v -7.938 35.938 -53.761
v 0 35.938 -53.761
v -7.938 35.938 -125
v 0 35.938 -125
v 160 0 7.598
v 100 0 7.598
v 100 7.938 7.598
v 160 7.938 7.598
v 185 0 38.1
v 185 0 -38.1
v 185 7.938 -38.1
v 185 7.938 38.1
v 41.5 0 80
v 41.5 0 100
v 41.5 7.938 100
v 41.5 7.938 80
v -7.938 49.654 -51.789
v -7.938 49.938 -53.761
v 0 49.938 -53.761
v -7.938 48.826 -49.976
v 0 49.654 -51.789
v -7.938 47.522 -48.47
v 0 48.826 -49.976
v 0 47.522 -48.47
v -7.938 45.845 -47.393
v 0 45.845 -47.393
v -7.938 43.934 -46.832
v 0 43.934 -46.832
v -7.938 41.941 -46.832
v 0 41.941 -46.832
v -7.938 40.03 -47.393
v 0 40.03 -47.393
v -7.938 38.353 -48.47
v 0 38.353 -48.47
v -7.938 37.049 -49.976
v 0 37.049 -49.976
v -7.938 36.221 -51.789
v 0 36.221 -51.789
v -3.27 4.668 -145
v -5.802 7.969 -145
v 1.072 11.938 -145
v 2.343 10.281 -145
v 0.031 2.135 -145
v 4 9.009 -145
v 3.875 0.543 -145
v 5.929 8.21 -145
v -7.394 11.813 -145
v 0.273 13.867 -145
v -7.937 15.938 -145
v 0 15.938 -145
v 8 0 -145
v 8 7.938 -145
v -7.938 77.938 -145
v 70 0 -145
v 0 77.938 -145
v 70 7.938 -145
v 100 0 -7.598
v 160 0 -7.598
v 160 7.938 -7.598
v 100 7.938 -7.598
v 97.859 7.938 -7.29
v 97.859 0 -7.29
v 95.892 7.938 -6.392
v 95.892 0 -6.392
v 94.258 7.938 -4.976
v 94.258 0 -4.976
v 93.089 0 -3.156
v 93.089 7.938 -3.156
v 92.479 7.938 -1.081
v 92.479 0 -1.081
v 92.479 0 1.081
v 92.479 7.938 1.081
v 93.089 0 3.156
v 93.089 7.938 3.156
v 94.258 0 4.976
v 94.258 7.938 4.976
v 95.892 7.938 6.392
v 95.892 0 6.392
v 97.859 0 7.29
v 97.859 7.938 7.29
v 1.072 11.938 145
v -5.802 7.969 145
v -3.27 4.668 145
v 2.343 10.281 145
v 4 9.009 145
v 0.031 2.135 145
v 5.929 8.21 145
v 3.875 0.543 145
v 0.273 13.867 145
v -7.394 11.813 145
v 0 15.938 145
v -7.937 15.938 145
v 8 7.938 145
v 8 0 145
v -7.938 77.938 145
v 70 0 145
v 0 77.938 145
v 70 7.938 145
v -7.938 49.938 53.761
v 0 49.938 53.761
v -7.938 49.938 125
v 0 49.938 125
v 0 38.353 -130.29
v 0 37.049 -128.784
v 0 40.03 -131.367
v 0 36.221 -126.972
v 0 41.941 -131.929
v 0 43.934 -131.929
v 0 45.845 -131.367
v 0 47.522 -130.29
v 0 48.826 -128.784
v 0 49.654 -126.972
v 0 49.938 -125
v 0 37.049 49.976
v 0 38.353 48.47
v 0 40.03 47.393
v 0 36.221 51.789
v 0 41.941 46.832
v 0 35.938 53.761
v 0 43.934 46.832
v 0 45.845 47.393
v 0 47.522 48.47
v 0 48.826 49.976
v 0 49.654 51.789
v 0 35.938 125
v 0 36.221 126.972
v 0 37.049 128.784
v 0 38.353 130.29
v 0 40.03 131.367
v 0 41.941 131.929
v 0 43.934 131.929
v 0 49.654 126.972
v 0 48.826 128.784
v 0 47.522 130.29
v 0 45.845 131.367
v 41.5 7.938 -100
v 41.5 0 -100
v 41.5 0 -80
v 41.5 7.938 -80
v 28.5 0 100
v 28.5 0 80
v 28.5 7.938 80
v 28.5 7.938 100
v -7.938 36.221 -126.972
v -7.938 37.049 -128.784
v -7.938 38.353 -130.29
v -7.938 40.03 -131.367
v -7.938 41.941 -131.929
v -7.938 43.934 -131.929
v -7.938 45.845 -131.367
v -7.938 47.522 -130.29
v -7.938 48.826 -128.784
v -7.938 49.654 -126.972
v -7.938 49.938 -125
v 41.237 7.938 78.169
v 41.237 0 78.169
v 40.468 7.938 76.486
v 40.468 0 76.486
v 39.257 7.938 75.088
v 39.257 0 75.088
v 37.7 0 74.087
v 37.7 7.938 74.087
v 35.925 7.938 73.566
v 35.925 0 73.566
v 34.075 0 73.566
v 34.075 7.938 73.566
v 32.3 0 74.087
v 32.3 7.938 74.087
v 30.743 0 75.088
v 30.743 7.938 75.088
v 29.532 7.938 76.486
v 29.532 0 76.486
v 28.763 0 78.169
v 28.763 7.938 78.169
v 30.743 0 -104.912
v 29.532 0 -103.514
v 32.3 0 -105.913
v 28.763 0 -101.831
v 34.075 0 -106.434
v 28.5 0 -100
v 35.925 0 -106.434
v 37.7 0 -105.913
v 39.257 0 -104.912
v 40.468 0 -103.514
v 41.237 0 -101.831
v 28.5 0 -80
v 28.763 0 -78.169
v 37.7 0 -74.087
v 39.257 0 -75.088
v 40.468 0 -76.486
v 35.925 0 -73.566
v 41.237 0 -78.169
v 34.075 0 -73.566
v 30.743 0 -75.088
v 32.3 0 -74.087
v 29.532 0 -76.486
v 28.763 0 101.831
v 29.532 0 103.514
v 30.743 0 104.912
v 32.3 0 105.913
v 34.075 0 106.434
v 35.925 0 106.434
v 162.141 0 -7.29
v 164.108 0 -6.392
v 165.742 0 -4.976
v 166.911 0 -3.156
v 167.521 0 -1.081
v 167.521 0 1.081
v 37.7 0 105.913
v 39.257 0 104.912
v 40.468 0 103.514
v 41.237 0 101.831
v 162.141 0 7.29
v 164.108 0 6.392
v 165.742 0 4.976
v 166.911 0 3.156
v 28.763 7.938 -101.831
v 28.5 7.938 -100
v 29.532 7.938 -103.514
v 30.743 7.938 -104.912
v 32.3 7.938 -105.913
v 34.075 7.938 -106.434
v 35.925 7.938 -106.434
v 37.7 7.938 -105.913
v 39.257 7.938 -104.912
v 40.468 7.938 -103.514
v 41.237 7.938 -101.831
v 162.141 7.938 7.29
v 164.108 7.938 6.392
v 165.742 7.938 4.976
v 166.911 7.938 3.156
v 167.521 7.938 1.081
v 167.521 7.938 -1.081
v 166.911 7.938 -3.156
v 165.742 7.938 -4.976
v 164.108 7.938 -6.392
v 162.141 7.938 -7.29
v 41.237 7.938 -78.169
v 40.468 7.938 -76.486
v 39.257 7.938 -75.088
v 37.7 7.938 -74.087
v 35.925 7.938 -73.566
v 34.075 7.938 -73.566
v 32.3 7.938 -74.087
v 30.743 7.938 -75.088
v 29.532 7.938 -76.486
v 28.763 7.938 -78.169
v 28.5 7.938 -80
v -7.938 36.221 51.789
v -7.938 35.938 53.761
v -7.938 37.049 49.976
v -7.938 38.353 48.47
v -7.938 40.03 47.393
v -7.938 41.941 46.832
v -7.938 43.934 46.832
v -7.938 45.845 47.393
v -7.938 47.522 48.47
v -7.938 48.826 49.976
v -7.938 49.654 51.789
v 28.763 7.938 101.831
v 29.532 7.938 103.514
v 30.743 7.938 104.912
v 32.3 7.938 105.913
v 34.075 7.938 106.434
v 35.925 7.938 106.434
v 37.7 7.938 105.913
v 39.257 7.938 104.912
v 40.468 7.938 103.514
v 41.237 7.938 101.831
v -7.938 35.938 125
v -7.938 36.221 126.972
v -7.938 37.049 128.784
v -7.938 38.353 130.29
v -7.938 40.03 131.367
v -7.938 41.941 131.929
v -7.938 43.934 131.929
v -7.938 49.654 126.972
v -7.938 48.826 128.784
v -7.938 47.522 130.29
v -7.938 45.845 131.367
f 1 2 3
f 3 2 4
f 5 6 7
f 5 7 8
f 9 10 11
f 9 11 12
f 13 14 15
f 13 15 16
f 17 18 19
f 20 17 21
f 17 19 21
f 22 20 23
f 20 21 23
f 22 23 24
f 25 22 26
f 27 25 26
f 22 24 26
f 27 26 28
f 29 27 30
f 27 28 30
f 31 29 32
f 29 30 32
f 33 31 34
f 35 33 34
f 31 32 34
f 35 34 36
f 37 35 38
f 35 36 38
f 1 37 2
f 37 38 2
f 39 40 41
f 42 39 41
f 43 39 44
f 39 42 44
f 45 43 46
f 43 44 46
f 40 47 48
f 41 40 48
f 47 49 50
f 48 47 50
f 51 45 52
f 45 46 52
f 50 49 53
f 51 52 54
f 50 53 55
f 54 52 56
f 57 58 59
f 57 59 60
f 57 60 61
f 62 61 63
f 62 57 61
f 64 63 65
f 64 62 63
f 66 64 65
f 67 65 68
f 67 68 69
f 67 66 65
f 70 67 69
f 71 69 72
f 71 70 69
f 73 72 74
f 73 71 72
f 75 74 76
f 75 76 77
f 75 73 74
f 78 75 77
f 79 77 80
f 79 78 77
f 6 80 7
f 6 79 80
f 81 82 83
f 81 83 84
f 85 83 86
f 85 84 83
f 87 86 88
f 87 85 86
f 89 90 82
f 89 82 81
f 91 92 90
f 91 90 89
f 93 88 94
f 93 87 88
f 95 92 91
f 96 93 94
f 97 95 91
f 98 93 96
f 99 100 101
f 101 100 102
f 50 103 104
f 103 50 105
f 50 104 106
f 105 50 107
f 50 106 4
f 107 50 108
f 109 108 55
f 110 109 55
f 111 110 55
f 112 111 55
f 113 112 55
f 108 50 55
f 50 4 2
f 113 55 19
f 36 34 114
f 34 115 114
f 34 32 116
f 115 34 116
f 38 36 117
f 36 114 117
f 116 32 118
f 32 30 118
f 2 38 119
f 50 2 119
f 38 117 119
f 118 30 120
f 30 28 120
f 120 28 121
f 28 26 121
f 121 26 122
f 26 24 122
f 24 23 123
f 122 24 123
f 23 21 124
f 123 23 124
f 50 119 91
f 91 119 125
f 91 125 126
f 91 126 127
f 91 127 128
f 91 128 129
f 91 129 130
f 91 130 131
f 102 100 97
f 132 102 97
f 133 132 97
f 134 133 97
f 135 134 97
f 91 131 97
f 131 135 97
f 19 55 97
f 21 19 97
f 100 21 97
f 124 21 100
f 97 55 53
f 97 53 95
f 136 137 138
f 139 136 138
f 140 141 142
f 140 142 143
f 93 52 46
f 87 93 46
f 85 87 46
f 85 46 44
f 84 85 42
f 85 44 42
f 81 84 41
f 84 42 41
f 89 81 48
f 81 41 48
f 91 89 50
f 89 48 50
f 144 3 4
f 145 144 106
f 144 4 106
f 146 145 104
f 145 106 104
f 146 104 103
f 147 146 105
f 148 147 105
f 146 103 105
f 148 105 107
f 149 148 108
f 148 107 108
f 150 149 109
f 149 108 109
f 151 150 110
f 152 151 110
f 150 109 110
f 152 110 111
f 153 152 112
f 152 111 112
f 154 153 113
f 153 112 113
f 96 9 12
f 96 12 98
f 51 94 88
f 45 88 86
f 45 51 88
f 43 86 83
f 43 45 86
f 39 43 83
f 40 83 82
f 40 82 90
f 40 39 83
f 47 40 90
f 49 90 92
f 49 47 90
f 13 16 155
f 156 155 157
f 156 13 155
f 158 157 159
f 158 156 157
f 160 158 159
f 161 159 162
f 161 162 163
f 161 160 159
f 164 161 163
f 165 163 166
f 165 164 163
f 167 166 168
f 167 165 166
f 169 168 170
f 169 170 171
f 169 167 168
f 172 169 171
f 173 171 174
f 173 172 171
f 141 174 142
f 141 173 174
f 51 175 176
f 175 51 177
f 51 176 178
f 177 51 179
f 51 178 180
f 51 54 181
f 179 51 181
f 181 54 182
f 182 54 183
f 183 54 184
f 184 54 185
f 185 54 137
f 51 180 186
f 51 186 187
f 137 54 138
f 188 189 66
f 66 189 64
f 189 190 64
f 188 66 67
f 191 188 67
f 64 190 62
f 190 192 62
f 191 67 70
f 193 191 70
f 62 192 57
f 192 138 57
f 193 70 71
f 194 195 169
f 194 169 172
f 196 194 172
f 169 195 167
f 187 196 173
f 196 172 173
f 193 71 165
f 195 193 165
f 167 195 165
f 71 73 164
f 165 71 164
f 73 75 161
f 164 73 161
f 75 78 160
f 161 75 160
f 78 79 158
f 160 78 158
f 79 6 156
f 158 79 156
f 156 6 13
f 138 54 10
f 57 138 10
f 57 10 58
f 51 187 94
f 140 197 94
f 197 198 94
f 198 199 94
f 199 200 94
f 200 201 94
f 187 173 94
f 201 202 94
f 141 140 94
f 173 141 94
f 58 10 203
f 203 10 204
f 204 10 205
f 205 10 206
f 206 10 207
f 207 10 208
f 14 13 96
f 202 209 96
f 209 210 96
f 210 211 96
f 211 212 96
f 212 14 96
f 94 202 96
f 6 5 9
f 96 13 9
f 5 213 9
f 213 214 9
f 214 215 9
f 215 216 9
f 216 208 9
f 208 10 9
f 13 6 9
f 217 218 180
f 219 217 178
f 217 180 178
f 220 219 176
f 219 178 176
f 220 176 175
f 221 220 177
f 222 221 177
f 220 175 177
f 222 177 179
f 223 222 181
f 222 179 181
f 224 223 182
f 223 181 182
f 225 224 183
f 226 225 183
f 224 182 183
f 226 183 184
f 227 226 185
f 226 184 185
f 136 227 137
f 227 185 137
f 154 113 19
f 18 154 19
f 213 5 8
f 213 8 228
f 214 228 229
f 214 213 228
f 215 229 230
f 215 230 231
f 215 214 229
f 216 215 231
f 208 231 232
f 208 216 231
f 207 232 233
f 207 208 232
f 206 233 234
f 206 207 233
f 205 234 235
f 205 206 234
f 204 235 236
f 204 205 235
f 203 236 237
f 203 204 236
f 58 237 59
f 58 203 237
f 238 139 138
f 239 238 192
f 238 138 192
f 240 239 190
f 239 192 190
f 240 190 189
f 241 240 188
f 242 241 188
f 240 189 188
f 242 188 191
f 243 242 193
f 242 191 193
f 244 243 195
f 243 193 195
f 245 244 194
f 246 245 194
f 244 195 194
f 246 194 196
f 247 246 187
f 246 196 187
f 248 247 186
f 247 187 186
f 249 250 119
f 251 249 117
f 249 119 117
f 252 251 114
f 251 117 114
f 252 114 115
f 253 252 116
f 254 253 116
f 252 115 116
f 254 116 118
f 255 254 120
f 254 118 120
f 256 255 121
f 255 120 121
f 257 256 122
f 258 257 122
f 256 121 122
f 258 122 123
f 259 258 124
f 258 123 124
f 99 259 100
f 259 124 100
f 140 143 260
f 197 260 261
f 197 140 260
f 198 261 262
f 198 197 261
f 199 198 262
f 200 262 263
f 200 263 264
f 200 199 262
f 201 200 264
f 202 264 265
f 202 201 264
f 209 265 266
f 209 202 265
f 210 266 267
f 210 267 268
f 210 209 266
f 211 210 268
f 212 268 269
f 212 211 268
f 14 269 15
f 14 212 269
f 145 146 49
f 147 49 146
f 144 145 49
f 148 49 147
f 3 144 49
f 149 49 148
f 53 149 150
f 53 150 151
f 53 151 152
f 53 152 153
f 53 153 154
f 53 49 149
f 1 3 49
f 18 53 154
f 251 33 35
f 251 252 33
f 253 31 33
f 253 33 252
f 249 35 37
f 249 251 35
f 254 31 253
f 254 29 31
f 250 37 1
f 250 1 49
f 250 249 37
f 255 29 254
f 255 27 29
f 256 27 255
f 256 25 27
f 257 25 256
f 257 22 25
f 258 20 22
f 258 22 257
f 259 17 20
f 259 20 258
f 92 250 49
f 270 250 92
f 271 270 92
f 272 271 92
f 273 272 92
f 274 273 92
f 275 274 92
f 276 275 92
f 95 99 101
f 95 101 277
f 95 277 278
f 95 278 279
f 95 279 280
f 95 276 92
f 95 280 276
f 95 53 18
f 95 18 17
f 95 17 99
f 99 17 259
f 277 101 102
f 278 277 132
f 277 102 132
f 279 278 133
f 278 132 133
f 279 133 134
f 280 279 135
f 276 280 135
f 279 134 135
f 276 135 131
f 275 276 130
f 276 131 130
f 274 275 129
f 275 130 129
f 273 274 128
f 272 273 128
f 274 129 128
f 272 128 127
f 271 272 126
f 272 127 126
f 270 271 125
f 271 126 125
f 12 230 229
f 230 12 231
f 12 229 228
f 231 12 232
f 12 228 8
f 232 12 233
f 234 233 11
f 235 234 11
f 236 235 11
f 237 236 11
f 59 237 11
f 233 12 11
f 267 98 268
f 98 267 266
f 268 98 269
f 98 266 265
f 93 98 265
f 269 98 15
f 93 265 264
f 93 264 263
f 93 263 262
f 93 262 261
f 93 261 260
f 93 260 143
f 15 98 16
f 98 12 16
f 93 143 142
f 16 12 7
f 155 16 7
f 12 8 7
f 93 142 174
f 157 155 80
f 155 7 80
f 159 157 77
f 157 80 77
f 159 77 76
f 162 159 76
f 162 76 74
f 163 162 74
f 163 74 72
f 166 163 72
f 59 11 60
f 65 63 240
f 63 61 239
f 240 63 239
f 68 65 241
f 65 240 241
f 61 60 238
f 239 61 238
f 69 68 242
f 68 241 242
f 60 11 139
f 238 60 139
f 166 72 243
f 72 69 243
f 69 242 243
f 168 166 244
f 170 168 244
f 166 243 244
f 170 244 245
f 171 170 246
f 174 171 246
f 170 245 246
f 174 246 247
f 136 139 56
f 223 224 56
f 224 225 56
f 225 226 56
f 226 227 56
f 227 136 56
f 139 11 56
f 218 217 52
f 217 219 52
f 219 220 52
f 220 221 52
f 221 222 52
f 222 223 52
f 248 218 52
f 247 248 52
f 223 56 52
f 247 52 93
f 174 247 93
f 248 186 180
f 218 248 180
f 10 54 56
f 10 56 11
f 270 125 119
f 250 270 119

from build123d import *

# Parameters (mm, degrees)
SALIENTE_EXTRUIR1_DEPTH   = 7.9375
CROQUIS2_W                = 290
CROQUIS2_H                = 77.9375
SALIENTE_EXTRUIR2_DEPTH   = 7.9375
CONVERTIR_S_LIDO1_START   = -145
CONVERTIR_S_LIDO1_DEPTH   = 290
CONVERTIR_S_LIDO1_2_DEPTH = 290


# Read off the part's stored shape, not the designer's step: Convertir-Sólido1
with BuildPart() as part:
    # Croquis1 → Saliente-Extruir1 (new body)
    with BuildSketch(Plane(origin=(0, 0, 0), x_dir=(1, 0, 0), z_dir=(0, 1, 0))):
        Polygon((70, -145), (0, -145), (0, 145), (70, 145), (185, 38.1), (185, -38.1), align=None)
        with BuildLine():
            ThreePointArc((41.5, -80), (35, -73.5), (28.5, -80))
            Line((28.5, -80), (28.5, -100))
            ThreePointArc((28.5, -100), (35, -106.5), (41.5, -100))
            Line((41.5, -100), (41.5, -80))
        make_face(mode=Mode.SUBTRACT)
        with BuildLine():
            ThreePointArc((160, -7.597922996), (167.597922996, 0), (160, 7.597922996))
            Line((160, 7.597922996), (100, 7.597922996))
            ThreePointArc((100, 7.597922996), (92.402077004, 0), (100, -7.597922996))
            Line((100, -7.597922996), (160, -7.597922996))
        make_face(mode=Mode.SUBTRACT)
        with BuildLine():
            Line((41.5, 100), (41.5, 80))
            ThreePointArc((41.5, 80), (35, 73.5), (28.5, 80))
            Line((28.5, 80), (28.5, 100))
            ThreePointArc((28.5, 100), (35, 106.5), (41.5, 100))
        make_face(mode=Mode.SUBTRACT)
    extrude(amount=SALIENTE_EXTRUIR1_DEPTH)

    # Croquis2 → Saliente-Extruir2 (add)
    with BuildSketch(Plane.ZY):
        with Locations((0, 38.96875)):
            Rectangle(CROQUIS2_W, CROQUIS2_H)
        with BuildLine():
            ThreePointArc((-125, 35.9375), (-132, 42.9375), (-125, 49.9375))
            Line((-125, 49.9375), (-53.76065494, 49.9375))
            ThreePointArc((-53.76065494, 49.9375), (-46.76065494, 42.9375), (-53.76065494, 35.9375))
            Line((-53.76065494, 35.9375), (-125, 35.9375))
        make_face(mode=Mode.SUBTRACT)
        with BuildLine():
            Line((53.76065494, 49.9375), (125, 49.9375))
            ThreePointArc((125, 49.9375), (132, 42.9375), (125, 35.9375))
            Line((125, 35.9375), (53.76065494, 35.9375))
            ThreePointArc((53.76065494, 35.9375), (46.76065494, 42.9375), (53.76065494, 49.9375))
        make_face(mode=Mode.SUBTRACT)
    extrude(amount=SALIENTE_EXTRUIR2_DEPTH)

    # Convertir-Sólido1 outline → Convertir-Sólido1 (cut)
    with BuildSketch(Plane.XY.offset(CONVERTIR_S_LIDO1_START)):
        with BuildLine():
            Line((-7.9375, 0), (8, 0))
            ThreePointArc((8, 0), (-3.269514325, 4.667985675), (-7.9375, 15.9375))
            Line((-7.9375, 15.9375), (-7.9375, 0))
        make_face()
    extrude(amount=CONVERTIR_S_LIDO1_DEPTH, mode=Mode.SUBTRACT)

    # Convertir-S_lido1 2 outline → Convertir-S_lido1 2 (add)
    with BuildSketch(Plane.XY.offset(CONVERTIR_S_LIDO1_START)):
        with BuildLine():
            Line((0, 7.9375), (8, 7.9375))
            ThreePointArc((8, 7.9375), (2.343145751, 10.280645751), (0, 15.9375))
            Line((0, 15.9375), (0, 7.9375))
        make_face()
    extrude(amount=CONVERTIR_S_LIDO1_2_DEPTH)


solid = part.part
